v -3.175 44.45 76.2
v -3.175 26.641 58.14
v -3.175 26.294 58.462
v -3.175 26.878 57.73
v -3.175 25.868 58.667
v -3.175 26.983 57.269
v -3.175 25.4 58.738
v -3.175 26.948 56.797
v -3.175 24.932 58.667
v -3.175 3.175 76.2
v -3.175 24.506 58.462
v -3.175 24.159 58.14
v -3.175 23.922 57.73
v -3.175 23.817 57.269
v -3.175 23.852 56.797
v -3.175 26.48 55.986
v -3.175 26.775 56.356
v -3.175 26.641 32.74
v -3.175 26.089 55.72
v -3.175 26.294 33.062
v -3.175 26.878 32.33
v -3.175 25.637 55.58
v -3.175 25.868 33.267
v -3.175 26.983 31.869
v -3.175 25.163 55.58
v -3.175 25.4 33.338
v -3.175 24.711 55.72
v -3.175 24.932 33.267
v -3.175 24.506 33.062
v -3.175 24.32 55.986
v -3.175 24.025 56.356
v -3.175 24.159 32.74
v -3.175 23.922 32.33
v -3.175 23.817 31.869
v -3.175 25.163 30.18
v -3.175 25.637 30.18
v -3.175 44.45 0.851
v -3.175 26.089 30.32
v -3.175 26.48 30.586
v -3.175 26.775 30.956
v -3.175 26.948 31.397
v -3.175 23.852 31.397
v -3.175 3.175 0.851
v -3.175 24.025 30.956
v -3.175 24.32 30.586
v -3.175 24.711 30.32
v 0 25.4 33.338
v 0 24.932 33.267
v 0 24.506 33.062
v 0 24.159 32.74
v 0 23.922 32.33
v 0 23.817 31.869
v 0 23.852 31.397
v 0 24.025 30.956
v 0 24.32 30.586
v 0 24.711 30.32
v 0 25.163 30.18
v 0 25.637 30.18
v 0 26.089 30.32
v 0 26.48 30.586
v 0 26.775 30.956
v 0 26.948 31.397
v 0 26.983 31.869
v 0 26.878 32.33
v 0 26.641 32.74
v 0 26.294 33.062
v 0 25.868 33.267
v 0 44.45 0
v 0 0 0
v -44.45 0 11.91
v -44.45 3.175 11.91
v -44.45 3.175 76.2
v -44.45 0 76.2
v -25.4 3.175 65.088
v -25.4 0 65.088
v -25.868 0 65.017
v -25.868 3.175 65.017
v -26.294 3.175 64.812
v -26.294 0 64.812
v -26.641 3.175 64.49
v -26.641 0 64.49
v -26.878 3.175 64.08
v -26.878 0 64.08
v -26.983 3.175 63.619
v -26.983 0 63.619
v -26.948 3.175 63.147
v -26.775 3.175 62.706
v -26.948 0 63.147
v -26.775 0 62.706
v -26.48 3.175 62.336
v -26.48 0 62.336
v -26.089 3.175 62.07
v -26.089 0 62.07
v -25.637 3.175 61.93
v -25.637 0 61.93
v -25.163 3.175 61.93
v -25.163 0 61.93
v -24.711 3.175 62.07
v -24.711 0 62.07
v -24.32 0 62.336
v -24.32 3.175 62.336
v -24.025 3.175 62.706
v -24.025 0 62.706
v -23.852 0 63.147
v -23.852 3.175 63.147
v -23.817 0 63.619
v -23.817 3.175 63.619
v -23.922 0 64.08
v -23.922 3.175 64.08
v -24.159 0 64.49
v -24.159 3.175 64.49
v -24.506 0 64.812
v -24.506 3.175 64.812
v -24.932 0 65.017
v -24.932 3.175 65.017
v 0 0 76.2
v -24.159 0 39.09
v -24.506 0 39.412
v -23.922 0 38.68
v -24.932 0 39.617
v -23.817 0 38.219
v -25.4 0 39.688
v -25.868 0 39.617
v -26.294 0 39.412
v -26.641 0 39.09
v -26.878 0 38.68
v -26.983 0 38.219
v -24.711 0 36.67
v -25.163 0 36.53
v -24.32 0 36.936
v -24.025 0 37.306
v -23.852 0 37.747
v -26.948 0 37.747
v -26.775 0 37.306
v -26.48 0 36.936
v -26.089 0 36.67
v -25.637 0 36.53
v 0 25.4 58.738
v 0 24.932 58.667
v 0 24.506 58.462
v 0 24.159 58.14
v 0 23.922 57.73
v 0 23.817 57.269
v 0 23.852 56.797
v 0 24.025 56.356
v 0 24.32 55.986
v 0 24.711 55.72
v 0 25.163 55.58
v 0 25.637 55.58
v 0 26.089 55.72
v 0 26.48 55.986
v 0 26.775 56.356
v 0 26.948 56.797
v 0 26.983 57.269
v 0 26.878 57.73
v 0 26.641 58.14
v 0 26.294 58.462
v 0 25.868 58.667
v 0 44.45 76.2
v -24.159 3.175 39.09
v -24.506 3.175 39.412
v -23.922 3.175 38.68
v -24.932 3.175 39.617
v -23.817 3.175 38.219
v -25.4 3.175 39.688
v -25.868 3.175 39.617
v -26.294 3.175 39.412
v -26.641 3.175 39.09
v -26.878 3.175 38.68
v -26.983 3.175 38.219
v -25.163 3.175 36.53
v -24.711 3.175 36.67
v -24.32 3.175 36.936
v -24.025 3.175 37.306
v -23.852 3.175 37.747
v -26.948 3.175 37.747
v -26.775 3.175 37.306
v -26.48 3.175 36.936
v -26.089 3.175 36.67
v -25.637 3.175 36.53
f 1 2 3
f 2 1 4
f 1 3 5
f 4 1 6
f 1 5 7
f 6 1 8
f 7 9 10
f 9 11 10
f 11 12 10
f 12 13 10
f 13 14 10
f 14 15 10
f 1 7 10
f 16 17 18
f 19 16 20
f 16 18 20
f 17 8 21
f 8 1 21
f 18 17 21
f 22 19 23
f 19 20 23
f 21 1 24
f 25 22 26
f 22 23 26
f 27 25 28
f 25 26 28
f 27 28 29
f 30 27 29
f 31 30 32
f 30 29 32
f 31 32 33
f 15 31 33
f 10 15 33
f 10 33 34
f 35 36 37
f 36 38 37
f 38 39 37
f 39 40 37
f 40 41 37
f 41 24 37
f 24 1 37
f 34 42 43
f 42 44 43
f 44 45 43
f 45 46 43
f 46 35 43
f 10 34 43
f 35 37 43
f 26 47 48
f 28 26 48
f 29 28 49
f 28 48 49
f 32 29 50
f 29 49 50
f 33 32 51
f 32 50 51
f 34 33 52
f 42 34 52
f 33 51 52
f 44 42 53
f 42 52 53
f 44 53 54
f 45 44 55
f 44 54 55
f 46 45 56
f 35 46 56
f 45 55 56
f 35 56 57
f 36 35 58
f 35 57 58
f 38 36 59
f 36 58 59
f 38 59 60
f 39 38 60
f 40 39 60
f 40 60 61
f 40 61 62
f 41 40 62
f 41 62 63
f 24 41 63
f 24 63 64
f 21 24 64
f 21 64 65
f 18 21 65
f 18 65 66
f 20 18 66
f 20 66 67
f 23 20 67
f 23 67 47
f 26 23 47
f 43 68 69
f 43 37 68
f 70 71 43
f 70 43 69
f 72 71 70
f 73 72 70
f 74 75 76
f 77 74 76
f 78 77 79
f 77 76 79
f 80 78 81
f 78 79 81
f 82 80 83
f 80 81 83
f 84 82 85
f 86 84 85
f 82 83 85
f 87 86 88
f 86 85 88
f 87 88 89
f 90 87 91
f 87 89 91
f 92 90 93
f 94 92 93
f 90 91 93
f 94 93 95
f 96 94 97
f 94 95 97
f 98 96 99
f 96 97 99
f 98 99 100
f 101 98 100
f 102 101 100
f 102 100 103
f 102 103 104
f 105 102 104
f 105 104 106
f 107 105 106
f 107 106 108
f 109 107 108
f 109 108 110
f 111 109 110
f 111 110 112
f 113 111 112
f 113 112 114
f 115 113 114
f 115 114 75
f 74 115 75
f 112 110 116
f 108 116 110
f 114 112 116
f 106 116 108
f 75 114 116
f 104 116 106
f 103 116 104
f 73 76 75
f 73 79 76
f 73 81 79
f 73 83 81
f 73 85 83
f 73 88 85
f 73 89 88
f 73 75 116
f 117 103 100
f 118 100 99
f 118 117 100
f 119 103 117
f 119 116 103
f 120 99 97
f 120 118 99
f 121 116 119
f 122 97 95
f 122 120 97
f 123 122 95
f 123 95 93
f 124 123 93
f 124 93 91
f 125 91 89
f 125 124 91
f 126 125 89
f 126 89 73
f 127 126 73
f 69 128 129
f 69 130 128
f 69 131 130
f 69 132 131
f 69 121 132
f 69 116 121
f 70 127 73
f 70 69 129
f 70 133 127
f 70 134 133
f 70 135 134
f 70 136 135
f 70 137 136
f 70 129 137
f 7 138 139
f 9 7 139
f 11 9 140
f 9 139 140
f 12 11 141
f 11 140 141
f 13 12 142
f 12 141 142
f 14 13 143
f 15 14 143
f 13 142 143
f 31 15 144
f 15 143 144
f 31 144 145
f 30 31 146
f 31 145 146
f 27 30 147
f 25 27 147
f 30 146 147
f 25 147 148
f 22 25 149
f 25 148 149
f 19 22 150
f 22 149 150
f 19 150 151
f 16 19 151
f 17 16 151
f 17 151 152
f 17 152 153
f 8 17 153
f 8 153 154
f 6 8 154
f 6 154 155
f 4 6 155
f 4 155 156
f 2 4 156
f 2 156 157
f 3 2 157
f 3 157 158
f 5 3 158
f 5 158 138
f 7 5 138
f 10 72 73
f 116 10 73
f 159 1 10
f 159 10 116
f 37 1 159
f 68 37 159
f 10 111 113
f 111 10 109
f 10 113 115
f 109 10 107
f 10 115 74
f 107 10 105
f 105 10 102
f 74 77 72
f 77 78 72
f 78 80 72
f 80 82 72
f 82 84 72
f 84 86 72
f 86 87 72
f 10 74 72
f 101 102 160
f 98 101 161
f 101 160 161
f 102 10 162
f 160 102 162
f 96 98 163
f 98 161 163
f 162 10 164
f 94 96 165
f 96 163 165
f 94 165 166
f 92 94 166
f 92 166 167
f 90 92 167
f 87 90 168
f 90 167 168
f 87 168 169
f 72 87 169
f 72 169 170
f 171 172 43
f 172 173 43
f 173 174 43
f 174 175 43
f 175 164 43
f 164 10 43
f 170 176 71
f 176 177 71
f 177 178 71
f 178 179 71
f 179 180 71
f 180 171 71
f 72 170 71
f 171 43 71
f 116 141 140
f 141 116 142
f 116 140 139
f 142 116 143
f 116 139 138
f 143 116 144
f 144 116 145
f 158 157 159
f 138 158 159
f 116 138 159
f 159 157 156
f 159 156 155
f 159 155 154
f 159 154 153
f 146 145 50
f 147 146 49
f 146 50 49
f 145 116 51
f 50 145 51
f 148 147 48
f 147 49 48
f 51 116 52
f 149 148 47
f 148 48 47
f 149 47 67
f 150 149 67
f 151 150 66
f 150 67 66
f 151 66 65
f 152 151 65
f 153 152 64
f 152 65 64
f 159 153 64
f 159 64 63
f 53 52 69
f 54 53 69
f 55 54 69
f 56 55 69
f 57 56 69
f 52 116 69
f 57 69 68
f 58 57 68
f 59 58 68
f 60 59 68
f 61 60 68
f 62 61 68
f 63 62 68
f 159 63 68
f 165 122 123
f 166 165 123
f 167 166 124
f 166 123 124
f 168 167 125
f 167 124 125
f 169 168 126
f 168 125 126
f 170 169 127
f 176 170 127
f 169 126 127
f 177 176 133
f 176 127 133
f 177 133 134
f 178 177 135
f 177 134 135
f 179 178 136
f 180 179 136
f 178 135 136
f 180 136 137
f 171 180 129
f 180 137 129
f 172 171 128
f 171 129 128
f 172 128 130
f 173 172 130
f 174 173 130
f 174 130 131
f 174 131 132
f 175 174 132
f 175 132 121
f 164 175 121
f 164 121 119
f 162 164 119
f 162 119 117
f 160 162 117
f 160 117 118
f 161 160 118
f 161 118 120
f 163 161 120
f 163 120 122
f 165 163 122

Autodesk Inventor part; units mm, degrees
ref_plane "YZ Plane" through (0, 0, 0) normal (1, 0, 0) x (0, 1, 0)
ref_plane "XZ Plane" through (0, 0, 0) normal (0, 1, 0) x (-1, 0, 0)
sketch "Sketch1" plane through (0, 0, 0) normal (0, 0, 1) x (1, 0, 0)
  line L0 (0, 0) -> (0, 44.45)
  line L1 (0, 0) -> (-44.45, 0)
  line L2 (-3.175, 44.45) -> (-3.175, 3.175)
  line L3 (-3.175, 3.175) -> (-44.45, 3.175)
  line L4 (-3.175, 44.45) -> (0, 44.45)
  line L5 (-44.45, 3.175) -> (-44.45, 0)
  dimension "d0" = 44.45
  dimension "d1" = 44.45
  dimension "d2" = 3.175
extrude "Extrusion1" add sketch "Sketch1" along normal blind 76.2
ref_plane "Work Plane1" through (0, 0, 0) normal (-0.2588, 0, -0.9659) x (0, 1, 0)
split "Split1" plane through (0, 0, 0) removes the side toward (-0.2588, 0, -0.9659)
sketch "Sketch2" plane through (-44.45, 3.175, 76.2) normal (0, 1, 0) x (1, 0, 0)
  line L0 (0, 0) -> (44.45, 0) projected
  circle A0 centre (19.05, 12.7) radius 2.0125
  circle A1 centre (19.05, 38.1) radius 1.8125
  line L1 (0, 64.2897) -> (0, 0) projected
  point P0 (44.45, 76.2)
  dimension "d6" = 12.7
  dimension "d7" = 25.4
  dimension "d28" = 19.05
  dimension "d29" = 19.05
hole "Hole1" at (-25.4, 3.175, 38.1) at (-25.4, 3.175, 63.5) direction (0, -1, 0) diameter 3.175 end through all
sketch "Sketch3" plane through (-3.175, 3.175, 76.2) normal (-1, 0, 0) x (0, 0, 1)
  line L0 (0, -3.175) -> (0, 41.275)
  line L1 (-75.3493, 41.275) -> (-75.3493, 0)
  circle A0 centre (-19.05, 22.225) radius 1.7587
  circle A1 centre (-44.45, 22.225) radius 1.632
  line L2 (-75.3493, 41.275) -> (0, 41.275) projected
  point P0 (-76.2, -3.175)
  dimension "d15" = 19.05
  dimension "d16" = 25.4
  dimension "d26" = 19.05
  dimension "d27" = 19.05
hole "Hole2" at (-3.175, 25.4, 31.75) at (-3.175, 25.4, 57.15) direction (1, 0, 0) diameter 3.175 end through all
properties part number "ring support right" material "Aluminum 6061"
